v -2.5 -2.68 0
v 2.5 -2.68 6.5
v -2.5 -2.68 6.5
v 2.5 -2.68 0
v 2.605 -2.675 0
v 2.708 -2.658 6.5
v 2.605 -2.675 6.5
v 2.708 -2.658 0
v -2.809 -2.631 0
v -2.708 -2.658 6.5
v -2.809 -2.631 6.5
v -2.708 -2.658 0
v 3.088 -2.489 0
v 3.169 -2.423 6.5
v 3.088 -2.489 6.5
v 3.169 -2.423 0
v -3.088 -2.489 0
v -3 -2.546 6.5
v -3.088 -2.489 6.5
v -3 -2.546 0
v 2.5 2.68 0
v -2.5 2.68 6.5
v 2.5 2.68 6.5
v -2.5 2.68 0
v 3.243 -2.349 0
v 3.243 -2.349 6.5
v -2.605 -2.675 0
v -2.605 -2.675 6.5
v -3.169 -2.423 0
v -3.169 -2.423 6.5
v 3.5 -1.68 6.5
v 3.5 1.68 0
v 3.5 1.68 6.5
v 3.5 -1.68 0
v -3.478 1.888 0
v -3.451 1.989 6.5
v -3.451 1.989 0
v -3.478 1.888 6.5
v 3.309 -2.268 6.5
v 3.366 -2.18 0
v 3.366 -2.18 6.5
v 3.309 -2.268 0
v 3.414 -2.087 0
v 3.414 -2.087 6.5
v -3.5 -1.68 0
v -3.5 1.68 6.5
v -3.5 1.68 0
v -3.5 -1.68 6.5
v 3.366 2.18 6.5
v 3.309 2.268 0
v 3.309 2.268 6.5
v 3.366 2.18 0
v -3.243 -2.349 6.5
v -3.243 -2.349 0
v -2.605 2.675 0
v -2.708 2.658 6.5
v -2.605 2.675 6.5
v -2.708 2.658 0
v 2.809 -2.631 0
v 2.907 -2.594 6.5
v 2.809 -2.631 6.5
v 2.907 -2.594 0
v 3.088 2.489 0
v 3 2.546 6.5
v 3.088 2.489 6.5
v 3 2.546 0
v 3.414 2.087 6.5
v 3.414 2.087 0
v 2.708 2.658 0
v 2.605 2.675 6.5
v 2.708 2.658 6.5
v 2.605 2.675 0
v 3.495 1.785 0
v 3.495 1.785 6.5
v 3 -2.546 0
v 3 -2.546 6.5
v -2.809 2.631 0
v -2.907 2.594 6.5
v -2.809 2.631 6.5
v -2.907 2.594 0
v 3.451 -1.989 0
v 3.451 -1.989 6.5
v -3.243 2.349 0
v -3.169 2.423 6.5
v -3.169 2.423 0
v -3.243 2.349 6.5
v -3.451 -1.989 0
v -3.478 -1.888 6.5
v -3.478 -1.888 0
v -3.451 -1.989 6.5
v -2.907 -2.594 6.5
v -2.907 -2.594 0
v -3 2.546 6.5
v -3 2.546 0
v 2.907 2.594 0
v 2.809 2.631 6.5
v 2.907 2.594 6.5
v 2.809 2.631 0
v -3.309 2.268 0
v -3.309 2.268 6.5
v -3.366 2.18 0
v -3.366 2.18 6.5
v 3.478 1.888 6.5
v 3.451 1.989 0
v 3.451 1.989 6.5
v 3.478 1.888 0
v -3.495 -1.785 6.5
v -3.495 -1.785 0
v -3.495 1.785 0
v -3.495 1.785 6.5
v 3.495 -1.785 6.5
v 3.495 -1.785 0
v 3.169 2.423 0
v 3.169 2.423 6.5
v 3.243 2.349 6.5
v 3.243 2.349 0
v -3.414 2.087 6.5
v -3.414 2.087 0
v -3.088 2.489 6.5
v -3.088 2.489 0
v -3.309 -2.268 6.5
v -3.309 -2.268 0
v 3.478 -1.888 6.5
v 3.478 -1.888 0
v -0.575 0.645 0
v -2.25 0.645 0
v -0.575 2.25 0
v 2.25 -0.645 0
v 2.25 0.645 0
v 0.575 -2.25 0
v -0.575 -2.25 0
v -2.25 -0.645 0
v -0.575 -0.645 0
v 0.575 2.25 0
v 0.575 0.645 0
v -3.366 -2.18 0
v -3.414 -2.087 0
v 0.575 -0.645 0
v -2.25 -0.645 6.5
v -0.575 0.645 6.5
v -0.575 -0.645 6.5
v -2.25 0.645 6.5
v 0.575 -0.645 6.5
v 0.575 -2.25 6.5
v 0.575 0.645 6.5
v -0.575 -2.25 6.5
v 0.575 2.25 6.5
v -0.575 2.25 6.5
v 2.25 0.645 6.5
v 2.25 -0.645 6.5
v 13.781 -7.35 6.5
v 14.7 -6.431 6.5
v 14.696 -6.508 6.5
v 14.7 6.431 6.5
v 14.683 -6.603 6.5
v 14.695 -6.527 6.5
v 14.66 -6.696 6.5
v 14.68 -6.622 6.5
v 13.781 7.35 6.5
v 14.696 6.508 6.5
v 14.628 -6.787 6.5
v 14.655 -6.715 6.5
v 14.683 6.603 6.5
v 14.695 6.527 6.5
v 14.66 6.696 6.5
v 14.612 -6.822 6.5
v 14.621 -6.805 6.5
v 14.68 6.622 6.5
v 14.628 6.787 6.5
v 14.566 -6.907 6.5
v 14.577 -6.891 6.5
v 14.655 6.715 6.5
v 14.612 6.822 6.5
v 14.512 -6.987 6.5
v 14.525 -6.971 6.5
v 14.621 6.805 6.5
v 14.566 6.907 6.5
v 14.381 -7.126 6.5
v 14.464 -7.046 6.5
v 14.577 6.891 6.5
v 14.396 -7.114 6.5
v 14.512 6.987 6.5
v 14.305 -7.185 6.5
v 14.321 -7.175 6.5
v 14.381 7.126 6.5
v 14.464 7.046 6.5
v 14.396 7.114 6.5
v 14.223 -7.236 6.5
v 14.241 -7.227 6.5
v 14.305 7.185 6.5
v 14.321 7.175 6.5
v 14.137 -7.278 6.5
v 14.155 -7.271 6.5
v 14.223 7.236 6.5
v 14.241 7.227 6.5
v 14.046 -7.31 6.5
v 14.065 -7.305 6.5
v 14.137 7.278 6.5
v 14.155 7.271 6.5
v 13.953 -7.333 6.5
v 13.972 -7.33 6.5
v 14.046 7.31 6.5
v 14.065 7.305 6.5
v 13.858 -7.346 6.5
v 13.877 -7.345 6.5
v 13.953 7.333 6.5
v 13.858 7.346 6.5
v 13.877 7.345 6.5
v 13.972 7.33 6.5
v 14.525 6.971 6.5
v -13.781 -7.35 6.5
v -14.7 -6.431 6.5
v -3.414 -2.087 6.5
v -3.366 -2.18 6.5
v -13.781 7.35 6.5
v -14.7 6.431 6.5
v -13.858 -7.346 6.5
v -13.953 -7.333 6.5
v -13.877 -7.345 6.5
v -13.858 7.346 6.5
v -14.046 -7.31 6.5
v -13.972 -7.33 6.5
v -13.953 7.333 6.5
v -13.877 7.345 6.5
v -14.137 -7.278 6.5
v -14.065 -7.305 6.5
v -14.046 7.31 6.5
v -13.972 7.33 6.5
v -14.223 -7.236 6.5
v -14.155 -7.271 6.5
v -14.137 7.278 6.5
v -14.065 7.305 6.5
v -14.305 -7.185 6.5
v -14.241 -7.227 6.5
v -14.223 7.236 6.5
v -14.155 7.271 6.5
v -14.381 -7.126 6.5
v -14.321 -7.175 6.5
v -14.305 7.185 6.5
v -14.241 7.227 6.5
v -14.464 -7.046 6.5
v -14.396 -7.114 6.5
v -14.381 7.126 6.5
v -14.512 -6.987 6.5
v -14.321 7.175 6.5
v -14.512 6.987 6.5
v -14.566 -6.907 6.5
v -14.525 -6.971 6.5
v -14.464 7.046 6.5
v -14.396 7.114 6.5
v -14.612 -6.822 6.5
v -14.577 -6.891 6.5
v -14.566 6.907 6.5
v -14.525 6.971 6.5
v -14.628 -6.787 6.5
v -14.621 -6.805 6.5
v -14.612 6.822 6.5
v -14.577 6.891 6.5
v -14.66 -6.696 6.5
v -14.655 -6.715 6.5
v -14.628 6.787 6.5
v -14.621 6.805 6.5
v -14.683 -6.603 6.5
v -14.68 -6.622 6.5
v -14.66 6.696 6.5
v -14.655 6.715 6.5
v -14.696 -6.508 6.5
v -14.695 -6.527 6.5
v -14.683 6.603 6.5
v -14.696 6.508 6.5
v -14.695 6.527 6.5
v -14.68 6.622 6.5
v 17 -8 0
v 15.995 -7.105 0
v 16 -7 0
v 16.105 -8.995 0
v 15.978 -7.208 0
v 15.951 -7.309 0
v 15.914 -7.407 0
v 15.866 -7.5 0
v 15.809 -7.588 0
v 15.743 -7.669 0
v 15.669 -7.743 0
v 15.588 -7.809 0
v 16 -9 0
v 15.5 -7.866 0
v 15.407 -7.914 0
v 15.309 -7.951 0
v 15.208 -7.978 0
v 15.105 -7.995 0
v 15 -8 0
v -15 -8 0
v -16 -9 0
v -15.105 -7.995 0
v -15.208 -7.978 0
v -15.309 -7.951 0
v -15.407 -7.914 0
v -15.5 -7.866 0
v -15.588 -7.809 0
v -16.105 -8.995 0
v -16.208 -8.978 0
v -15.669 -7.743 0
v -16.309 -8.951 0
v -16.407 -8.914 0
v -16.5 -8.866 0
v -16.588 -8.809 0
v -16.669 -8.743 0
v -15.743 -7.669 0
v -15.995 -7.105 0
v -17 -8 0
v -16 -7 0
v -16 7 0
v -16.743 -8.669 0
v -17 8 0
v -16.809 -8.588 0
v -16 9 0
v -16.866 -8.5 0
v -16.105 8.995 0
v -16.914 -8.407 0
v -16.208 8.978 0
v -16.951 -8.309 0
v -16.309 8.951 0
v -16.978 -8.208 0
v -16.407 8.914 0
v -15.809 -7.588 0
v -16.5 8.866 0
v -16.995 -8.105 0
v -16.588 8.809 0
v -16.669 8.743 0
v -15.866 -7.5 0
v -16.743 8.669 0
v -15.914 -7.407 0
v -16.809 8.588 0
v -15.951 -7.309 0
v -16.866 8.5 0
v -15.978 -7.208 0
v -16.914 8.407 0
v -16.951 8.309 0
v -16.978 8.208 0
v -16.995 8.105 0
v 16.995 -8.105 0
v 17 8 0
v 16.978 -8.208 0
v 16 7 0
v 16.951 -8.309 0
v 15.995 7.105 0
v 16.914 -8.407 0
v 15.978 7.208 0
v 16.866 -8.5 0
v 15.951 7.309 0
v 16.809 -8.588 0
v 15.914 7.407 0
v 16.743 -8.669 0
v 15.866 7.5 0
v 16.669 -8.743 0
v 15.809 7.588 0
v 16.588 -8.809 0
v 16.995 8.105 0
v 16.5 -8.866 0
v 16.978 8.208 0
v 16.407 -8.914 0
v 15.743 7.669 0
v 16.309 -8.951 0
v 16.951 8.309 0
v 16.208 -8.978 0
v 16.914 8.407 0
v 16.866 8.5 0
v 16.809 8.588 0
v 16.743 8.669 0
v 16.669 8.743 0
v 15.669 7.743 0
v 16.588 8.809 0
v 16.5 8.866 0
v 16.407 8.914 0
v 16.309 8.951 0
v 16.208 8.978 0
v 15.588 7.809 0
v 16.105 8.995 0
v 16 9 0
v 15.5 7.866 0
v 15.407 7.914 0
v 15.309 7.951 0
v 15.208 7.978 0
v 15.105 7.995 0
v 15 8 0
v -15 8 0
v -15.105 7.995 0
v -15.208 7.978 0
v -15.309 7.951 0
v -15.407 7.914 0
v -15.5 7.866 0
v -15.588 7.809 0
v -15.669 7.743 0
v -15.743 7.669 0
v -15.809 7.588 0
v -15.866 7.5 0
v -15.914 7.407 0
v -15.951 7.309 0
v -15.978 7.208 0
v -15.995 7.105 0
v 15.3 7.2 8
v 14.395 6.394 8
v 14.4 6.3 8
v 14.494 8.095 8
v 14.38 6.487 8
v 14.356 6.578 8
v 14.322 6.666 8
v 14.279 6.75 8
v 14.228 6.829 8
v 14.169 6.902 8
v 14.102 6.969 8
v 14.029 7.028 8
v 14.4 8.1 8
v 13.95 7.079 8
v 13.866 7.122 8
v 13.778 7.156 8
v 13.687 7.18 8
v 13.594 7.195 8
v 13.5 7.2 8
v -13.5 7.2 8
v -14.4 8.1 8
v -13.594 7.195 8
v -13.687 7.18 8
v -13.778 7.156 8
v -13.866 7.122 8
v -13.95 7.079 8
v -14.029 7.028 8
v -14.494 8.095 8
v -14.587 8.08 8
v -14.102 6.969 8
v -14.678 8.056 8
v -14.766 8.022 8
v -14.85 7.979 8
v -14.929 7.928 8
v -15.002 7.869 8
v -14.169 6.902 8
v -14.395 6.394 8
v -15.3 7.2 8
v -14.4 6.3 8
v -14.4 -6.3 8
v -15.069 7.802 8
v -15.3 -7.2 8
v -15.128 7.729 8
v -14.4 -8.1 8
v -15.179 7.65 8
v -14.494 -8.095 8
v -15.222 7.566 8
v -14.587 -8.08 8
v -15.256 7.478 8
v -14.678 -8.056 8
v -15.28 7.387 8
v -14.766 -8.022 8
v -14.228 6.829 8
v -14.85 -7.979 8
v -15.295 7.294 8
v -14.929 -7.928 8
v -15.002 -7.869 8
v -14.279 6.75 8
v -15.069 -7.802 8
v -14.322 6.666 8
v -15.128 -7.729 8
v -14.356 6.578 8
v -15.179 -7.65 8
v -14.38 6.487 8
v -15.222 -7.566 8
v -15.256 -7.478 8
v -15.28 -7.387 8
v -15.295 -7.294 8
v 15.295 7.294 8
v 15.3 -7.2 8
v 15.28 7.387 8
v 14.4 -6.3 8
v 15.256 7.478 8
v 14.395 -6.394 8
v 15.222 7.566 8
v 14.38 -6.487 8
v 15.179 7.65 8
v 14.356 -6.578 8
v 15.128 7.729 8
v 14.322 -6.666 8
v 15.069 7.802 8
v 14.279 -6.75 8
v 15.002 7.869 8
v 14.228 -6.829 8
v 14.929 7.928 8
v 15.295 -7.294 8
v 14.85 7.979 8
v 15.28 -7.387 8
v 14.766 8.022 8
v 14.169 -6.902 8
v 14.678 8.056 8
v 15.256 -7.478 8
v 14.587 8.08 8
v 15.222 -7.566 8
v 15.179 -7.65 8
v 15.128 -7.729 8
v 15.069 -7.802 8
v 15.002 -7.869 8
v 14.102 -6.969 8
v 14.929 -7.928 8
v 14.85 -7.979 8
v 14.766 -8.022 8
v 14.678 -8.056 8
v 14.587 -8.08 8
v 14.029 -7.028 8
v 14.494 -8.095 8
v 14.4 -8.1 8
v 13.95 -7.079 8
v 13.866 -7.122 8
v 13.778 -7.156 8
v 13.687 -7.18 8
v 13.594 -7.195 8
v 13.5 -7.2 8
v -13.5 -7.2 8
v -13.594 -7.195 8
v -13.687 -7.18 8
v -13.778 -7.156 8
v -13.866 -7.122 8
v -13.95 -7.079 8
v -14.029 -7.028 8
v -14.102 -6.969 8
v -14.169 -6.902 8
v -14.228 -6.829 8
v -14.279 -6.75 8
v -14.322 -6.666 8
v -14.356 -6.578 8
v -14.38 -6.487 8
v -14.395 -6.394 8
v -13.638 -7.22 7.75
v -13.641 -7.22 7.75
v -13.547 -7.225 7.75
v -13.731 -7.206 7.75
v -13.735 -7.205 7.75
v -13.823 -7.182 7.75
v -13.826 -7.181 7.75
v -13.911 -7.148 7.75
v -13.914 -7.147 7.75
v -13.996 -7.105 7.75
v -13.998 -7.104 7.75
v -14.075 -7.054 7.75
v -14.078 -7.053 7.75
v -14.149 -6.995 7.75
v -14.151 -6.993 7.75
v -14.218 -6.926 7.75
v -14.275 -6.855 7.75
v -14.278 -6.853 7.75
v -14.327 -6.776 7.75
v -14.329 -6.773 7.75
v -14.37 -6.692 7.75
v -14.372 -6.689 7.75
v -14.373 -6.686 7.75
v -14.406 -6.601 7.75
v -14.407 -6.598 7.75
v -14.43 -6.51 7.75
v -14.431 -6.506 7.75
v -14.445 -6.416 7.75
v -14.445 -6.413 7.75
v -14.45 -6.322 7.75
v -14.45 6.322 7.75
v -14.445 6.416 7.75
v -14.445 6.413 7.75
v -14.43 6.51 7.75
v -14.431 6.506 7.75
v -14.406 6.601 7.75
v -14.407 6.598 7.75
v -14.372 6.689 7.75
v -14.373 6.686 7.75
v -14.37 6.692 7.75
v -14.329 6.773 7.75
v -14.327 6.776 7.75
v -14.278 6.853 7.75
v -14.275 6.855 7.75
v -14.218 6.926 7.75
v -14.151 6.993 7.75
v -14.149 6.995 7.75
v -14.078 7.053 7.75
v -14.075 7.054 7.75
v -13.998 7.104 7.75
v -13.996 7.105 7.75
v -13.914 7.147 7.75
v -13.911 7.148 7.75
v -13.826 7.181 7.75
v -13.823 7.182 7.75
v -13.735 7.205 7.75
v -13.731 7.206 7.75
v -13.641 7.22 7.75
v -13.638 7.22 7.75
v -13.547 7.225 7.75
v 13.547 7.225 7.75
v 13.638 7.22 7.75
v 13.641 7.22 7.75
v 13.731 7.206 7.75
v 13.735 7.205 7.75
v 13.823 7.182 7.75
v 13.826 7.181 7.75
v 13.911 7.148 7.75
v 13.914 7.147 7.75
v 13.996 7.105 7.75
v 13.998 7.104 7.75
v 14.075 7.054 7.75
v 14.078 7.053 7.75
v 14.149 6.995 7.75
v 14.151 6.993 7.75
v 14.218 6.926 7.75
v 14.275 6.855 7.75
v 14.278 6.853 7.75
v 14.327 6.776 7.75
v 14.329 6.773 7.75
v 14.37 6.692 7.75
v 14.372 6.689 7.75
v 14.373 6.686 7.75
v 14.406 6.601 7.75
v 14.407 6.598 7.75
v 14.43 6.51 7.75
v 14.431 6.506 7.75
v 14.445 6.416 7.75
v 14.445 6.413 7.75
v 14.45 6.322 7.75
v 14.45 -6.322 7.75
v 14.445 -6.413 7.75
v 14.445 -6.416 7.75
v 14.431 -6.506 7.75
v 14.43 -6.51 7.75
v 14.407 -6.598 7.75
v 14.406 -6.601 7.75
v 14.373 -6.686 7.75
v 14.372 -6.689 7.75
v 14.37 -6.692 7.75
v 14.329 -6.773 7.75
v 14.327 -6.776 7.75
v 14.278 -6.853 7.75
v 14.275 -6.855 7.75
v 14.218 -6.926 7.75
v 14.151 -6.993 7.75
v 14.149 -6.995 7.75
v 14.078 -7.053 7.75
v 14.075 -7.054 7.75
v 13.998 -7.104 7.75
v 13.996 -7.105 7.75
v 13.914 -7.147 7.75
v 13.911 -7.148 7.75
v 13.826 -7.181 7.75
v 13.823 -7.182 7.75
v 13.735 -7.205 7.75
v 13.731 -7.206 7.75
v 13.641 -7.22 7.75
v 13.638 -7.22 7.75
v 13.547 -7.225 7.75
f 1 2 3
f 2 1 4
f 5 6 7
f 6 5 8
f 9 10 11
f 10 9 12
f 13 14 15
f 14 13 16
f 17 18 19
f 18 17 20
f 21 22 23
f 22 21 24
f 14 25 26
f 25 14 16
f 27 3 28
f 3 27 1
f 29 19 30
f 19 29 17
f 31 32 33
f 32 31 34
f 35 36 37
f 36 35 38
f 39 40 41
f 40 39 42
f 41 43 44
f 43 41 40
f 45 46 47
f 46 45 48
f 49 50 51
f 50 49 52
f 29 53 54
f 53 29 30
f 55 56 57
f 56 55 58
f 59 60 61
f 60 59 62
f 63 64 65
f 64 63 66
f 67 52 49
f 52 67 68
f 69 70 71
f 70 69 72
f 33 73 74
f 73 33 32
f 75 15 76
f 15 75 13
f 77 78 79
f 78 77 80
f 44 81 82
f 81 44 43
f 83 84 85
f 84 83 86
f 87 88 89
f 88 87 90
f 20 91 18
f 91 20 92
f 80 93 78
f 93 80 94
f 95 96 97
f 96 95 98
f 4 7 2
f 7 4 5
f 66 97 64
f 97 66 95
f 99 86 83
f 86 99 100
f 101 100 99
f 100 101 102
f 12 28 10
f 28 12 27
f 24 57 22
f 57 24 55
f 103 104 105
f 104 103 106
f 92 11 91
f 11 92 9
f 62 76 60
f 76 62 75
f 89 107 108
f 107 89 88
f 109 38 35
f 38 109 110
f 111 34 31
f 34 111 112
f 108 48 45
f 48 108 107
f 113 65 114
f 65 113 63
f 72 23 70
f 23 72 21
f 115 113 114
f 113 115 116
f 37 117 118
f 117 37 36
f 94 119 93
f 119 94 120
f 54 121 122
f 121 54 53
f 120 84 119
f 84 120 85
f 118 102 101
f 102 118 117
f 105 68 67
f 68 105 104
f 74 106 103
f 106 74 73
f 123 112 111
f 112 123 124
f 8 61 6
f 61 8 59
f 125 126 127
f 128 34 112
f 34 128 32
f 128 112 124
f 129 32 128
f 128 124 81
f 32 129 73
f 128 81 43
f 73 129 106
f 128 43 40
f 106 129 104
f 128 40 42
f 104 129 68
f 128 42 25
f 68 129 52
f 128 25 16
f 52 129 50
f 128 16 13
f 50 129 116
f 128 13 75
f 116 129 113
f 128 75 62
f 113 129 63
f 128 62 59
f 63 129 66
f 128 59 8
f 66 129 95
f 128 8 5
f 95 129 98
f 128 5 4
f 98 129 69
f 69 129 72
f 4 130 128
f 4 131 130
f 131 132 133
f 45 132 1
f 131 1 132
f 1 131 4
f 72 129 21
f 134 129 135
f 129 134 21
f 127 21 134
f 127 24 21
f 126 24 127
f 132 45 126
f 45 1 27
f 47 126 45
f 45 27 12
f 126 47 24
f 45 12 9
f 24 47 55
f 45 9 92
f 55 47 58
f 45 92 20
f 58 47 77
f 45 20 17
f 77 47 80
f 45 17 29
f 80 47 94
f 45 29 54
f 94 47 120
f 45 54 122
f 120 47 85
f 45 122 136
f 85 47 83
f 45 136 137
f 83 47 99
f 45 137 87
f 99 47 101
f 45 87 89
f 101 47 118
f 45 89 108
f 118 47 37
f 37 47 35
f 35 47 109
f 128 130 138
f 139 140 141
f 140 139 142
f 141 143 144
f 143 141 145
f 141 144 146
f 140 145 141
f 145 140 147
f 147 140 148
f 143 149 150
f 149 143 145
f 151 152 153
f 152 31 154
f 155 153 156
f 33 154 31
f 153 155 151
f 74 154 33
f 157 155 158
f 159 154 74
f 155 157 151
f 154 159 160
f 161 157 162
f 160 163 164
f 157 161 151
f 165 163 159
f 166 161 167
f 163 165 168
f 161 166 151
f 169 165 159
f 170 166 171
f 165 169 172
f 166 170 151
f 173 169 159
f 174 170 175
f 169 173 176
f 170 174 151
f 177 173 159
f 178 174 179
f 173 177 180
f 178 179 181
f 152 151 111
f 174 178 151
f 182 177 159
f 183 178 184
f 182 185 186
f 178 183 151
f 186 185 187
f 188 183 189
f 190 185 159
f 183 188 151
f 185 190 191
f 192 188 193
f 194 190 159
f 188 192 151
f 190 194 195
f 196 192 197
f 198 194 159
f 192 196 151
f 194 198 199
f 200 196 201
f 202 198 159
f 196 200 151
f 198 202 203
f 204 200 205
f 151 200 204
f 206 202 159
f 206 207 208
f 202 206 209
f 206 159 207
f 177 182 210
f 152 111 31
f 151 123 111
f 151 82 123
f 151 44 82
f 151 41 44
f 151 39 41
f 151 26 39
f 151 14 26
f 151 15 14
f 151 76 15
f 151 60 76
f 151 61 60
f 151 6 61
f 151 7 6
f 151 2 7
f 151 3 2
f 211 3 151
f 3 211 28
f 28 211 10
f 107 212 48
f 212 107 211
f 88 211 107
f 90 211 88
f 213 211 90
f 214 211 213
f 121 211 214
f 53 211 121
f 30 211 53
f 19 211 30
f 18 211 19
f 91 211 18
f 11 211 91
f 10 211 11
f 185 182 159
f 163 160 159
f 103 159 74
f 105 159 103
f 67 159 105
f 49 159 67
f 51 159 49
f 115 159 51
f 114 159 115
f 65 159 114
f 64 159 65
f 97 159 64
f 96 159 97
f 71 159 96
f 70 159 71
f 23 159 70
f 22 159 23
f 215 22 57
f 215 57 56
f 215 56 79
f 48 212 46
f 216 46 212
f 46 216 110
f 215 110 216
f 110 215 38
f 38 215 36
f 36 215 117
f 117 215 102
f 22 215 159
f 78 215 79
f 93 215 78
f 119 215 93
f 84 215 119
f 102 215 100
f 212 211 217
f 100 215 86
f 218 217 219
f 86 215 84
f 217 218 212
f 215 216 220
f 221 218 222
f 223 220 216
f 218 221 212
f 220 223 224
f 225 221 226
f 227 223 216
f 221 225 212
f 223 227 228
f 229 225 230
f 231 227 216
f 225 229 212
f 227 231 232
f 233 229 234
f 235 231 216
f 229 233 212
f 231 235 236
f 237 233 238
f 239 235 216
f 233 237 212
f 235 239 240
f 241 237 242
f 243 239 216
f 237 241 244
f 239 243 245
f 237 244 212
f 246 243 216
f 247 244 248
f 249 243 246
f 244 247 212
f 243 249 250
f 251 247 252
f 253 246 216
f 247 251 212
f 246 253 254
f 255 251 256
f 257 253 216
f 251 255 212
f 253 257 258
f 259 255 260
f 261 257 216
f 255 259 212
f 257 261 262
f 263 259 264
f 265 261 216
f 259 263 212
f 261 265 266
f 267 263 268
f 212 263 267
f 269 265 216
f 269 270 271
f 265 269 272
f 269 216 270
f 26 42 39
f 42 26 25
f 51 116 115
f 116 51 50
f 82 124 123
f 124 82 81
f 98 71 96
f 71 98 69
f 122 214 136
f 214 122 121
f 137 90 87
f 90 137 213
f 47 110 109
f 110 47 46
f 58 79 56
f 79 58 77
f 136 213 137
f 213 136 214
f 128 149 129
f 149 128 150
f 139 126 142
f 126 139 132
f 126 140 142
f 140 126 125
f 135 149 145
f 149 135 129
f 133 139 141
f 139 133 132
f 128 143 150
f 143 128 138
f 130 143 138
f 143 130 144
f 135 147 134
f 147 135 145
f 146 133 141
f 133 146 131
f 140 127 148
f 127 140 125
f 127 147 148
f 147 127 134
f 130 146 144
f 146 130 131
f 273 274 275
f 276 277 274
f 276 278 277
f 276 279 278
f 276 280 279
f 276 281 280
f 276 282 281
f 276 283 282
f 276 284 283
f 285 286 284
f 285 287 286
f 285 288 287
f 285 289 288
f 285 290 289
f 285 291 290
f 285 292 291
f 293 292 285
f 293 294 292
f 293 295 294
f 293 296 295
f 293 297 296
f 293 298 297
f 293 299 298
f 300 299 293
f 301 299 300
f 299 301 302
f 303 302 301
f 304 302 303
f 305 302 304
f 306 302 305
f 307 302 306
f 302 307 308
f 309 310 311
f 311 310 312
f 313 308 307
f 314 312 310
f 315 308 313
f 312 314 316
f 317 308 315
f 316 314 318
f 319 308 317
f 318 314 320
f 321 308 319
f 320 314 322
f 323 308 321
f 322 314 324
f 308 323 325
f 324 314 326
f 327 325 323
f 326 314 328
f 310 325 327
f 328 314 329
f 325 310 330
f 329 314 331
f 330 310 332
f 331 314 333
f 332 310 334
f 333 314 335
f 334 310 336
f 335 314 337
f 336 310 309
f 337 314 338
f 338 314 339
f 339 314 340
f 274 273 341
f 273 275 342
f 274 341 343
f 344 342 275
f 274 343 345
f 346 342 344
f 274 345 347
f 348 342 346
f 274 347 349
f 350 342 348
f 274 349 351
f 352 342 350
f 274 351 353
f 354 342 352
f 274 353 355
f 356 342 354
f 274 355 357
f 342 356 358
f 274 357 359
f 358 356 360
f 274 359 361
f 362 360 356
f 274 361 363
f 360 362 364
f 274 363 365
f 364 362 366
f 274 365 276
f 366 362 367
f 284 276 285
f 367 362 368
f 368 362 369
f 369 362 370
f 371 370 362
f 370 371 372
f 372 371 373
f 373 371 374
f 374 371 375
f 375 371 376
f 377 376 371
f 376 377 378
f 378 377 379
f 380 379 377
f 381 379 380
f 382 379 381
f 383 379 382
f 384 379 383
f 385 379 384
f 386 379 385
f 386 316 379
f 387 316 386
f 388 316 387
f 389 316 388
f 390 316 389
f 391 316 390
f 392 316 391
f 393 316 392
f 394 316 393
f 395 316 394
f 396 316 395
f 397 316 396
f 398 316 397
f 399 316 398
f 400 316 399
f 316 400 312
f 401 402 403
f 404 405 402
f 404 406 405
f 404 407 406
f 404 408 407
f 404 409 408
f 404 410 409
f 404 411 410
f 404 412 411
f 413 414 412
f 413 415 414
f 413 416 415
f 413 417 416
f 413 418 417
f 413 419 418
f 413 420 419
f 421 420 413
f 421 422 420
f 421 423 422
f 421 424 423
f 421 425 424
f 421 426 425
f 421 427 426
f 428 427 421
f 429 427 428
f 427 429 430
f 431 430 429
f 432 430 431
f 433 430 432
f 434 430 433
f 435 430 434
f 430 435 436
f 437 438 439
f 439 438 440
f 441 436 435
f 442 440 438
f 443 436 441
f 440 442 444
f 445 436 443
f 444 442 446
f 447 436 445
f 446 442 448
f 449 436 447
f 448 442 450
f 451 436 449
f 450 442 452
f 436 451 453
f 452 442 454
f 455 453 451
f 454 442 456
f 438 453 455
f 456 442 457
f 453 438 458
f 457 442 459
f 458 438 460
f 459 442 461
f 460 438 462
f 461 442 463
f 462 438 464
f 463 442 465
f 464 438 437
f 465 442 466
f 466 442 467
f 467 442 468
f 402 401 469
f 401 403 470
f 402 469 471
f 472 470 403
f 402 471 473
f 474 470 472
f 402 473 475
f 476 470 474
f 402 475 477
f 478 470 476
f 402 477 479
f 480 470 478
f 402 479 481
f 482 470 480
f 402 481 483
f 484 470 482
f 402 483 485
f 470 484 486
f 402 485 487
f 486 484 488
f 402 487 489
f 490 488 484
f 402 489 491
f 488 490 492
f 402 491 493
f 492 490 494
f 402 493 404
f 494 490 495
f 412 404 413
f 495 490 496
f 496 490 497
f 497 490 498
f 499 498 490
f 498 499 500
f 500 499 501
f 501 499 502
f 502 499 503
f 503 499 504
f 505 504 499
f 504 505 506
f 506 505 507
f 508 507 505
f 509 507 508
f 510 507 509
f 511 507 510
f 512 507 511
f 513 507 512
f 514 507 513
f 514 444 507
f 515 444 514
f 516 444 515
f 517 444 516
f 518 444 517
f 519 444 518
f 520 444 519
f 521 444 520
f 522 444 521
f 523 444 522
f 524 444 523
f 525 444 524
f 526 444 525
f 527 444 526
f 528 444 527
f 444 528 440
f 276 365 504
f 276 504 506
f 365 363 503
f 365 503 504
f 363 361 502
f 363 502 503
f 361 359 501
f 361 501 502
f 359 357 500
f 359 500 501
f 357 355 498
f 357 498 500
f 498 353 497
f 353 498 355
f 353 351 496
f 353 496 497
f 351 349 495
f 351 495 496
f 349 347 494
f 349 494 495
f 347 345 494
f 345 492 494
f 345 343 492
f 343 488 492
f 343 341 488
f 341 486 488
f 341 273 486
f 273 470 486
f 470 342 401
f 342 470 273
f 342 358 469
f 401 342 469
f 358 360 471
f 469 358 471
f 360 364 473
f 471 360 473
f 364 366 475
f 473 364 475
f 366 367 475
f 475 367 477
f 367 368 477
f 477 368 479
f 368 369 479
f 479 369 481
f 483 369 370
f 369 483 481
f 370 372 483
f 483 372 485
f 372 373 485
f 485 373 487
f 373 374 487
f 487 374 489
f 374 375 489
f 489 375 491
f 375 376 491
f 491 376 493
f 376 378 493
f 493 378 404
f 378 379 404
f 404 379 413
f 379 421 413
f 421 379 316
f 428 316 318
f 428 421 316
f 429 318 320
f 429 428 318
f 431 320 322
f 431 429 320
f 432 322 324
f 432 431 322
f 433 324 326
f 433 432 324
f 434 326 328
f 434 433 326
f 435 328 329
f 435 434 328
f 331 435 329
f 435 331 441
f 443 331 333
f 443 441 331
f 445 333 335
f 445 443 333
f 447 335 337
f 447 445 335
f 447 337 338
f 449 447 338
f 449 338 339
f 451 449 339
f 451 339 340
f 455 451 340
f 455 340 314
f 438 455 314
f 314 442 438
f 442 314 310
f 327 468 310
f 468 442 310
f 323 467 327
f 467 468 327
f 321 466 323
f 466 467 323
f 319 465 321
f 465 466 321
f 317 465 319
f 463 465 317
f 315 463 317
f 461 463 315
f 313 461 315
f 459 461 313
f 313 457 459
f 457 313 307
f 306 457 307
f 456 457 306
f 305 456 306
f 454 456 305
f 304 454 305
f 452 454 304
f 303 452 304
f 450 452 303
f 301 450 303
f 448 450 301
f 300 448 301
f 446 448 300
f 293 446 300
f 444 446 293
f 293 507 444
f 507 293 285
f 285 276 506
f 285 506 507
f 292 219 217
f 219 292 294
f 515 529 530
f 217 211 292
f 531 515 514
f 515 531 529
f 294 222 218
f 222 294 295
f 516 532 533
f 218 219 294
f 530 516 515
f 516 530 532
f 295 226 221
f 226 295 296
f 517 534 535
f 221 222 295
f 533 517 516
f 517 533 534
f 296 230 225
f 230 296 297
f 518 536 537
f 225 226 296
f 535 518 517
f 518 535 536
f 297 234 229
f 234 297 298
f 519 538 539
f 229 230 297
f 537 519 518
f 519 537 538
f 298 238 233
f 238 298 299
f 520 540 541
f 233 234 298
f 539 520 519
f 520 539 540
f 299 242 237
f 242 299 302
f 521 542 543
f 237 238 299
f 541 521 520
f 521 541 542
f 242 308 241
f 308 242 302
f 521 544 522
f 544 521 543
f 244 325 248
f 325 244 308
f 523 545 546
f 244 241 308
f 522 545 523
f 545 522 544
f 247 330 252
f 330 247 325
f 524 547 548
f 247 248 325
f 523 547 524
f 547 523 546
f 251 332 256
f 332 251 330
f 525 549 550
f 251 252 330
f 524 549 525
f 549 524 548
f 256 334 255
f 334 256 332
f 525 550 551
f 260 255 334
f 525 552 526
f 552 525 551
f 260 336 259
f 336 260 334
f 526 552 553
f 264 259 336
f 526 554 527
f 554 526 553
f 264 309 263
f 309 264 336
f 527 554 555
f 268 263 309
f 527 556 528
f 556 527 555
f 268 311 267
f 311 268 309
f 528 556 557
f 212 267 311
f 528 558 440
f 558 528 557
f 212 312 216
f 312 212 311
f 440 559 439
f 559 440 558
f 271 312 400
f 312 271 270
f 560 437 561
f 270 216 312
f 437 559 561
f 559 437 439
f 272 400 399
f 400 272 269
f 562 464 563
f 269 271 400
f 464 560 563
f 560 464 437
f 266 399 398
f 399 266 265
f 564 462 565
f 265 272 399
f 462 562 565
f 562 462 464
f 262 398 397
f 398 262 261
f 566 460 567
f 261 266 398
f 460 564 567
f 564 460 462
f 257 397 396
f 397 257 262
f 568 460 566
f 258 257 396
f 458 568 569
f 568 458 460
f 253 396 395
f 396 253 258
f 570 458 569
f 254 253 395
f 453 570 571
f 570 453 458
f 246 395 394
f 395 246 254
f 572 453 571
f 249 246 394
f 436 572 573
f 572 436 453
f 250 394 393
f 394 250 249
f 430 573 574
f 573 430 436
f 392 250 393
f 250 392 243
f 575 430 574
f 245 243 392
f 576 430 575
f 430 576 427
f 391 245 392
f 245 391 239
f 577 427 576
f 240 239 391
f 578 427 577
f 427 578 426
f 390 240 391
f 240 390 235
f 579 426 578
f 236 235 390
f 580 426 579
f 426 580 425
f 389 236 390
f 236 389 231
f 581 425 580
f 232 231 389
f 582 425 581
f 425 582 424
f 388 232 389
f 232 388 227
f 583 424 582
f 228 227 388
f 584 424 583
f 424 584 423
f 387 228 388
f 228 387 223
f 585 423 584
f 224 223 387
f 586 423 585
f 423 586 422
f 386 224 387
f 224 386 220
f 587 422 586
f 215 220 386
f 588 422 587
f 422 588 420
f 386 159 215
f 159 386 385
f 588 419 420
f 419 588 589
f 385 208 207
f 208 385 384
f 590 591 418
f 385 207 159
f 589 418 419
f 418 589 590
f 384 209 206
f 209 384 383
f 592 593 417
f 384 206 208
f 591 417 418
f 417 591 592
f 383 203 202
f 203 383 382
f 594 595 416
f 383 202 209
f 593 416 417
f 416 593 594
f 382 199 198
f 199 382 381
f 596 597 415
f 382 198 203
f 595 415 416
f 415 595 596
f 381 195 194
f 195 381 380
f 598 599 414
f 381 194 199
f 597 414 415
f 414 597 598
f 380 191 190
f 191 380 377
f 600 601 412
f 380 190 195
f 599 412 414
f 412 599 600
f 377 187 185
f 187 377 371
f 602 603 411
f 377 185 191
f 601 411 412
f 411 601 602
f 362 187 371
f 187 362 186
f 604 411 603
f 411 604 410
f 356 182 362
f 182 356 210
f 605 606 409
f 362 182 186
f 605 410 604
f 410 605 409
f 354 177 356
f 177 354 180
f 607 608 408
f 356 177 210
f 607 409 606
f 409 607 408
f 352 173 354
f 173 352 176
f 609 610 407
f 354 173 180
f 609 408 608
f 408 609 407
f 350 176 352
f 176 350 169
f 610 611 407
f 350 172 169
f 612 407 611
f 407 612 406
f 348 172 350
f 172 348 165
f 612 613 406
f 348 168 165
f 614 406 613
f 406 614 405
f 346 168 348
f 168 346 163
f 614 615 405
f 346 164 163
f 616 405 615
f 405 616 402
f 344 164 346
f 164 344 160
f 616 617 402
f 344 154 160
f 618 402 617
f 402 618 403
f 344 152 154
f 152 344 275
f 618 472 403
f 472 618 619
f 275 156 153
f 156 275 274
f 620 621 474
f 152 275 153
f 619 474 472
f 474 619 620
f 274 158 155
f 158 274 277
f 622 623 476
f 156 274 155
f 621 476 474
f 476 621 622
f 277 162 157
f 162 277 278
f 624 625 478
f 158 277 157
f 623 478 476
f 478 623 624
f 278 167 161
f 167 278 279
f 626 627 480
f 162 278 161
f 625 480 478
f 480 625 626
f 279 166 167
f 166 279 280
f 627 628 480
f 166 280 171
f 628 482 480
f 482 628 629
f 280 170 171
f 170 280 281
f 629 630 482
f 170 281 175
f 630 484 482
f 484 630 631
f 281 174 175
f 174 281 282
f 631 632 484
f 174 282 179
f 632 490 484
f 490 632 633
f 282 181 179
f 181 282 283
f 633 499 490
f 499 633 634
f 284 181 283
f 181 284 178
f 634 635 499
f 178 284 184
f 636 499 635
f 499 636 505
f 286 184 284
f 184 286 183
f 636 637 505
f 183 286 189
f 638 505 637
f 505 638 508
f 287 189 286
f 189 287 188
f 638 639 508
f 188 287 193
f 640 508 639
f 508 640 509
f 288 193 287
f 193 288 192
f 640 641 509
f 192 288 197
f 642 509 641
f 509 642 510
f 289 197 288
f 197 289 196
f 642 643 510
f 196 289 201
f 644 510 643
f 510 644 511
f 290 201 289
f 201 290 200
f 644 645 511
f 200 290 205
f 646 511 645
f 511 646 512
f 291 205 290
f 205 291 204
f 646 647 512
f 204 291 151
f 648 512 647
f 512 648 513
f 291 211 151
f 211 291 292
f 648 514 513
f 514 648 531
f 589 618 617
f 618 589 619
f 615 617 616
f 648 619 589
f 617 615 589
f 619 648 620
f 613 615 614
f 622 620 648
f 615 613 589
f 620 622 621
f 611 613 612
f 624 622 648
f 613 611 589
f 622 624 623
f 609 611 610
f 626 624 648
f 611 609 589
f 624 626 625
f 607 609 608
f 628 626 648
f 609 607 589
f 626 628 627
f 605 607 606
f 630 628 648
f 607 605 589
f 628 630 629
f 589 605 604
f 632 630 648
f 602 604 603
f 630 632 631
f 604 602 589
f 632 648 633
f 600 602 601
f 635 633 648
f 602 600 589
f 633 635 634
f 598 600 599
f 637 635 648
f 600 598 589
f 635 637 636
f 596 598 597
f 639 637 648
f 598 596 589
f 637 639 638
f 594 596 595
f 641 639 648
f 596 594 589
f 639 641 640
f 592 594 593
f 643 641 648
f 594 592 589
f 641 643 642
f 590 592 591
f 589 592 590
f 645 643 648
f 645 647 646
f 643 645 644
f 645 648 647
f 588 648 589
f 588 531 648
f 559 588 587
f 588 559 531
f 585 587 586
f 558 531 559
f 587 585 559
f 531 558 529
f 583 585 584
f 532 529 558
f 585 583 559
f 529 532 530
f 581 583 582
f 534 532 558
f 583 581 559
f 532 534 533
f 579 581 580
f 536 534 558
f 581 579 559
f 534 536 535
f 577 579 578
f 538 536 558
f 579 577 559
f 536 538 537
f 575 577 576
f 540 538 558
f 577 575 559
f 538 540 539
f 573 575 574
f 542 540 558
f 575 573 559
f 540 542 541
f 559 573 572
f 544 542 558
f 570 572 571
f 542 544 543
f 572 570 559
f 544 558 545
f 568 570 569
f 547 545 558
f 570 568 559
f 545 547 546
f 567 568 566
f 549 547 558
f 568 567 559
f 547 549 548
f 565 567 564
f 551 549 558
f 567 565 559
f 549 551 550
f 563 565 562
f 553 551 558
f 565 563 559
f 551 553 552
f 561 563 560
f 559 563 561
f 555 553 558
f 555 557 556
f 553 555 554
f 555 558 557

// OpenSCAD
// Define higher resolution for transformations

$fn=60;

union() {
    // sides
    color("#FFA500")
    linear_extrude(height = 8, scale=0.90)
    difference() {
        offset(r=1) square([32, 16], true);
        offset(r=1) square([30, 14], true);
    }

    // top ceiling
    #color("#FF8C00")
    translate([0,0,6.5])
        linear_extrude(height = 1.25)
        offset(r=1)
        square([28, 13], true);

    // fitting support
    color("#FF7F50")
    translate([0, 0, 3.25])
    difference(){
        // housing fitting
        hull() {
            translate([2.50, 1.68, 0])   cylinder(6.5, 1, 1, true);
            translate([-2.50, 1.68, 0])  cylinder(6.5, 1, 1, true);
            translate([2.50, -1.68, 0])  cylinder(6.5, 1, 1, true);
            translate([-2.50, -1.68, 0]) cylinder(6.5, 1, 1, true);
        }
        // cross fitting cutoff
        cube([4.5, 1.29, 10], true);
        cube([1.15, 4.5, 10], true);
    }
}
